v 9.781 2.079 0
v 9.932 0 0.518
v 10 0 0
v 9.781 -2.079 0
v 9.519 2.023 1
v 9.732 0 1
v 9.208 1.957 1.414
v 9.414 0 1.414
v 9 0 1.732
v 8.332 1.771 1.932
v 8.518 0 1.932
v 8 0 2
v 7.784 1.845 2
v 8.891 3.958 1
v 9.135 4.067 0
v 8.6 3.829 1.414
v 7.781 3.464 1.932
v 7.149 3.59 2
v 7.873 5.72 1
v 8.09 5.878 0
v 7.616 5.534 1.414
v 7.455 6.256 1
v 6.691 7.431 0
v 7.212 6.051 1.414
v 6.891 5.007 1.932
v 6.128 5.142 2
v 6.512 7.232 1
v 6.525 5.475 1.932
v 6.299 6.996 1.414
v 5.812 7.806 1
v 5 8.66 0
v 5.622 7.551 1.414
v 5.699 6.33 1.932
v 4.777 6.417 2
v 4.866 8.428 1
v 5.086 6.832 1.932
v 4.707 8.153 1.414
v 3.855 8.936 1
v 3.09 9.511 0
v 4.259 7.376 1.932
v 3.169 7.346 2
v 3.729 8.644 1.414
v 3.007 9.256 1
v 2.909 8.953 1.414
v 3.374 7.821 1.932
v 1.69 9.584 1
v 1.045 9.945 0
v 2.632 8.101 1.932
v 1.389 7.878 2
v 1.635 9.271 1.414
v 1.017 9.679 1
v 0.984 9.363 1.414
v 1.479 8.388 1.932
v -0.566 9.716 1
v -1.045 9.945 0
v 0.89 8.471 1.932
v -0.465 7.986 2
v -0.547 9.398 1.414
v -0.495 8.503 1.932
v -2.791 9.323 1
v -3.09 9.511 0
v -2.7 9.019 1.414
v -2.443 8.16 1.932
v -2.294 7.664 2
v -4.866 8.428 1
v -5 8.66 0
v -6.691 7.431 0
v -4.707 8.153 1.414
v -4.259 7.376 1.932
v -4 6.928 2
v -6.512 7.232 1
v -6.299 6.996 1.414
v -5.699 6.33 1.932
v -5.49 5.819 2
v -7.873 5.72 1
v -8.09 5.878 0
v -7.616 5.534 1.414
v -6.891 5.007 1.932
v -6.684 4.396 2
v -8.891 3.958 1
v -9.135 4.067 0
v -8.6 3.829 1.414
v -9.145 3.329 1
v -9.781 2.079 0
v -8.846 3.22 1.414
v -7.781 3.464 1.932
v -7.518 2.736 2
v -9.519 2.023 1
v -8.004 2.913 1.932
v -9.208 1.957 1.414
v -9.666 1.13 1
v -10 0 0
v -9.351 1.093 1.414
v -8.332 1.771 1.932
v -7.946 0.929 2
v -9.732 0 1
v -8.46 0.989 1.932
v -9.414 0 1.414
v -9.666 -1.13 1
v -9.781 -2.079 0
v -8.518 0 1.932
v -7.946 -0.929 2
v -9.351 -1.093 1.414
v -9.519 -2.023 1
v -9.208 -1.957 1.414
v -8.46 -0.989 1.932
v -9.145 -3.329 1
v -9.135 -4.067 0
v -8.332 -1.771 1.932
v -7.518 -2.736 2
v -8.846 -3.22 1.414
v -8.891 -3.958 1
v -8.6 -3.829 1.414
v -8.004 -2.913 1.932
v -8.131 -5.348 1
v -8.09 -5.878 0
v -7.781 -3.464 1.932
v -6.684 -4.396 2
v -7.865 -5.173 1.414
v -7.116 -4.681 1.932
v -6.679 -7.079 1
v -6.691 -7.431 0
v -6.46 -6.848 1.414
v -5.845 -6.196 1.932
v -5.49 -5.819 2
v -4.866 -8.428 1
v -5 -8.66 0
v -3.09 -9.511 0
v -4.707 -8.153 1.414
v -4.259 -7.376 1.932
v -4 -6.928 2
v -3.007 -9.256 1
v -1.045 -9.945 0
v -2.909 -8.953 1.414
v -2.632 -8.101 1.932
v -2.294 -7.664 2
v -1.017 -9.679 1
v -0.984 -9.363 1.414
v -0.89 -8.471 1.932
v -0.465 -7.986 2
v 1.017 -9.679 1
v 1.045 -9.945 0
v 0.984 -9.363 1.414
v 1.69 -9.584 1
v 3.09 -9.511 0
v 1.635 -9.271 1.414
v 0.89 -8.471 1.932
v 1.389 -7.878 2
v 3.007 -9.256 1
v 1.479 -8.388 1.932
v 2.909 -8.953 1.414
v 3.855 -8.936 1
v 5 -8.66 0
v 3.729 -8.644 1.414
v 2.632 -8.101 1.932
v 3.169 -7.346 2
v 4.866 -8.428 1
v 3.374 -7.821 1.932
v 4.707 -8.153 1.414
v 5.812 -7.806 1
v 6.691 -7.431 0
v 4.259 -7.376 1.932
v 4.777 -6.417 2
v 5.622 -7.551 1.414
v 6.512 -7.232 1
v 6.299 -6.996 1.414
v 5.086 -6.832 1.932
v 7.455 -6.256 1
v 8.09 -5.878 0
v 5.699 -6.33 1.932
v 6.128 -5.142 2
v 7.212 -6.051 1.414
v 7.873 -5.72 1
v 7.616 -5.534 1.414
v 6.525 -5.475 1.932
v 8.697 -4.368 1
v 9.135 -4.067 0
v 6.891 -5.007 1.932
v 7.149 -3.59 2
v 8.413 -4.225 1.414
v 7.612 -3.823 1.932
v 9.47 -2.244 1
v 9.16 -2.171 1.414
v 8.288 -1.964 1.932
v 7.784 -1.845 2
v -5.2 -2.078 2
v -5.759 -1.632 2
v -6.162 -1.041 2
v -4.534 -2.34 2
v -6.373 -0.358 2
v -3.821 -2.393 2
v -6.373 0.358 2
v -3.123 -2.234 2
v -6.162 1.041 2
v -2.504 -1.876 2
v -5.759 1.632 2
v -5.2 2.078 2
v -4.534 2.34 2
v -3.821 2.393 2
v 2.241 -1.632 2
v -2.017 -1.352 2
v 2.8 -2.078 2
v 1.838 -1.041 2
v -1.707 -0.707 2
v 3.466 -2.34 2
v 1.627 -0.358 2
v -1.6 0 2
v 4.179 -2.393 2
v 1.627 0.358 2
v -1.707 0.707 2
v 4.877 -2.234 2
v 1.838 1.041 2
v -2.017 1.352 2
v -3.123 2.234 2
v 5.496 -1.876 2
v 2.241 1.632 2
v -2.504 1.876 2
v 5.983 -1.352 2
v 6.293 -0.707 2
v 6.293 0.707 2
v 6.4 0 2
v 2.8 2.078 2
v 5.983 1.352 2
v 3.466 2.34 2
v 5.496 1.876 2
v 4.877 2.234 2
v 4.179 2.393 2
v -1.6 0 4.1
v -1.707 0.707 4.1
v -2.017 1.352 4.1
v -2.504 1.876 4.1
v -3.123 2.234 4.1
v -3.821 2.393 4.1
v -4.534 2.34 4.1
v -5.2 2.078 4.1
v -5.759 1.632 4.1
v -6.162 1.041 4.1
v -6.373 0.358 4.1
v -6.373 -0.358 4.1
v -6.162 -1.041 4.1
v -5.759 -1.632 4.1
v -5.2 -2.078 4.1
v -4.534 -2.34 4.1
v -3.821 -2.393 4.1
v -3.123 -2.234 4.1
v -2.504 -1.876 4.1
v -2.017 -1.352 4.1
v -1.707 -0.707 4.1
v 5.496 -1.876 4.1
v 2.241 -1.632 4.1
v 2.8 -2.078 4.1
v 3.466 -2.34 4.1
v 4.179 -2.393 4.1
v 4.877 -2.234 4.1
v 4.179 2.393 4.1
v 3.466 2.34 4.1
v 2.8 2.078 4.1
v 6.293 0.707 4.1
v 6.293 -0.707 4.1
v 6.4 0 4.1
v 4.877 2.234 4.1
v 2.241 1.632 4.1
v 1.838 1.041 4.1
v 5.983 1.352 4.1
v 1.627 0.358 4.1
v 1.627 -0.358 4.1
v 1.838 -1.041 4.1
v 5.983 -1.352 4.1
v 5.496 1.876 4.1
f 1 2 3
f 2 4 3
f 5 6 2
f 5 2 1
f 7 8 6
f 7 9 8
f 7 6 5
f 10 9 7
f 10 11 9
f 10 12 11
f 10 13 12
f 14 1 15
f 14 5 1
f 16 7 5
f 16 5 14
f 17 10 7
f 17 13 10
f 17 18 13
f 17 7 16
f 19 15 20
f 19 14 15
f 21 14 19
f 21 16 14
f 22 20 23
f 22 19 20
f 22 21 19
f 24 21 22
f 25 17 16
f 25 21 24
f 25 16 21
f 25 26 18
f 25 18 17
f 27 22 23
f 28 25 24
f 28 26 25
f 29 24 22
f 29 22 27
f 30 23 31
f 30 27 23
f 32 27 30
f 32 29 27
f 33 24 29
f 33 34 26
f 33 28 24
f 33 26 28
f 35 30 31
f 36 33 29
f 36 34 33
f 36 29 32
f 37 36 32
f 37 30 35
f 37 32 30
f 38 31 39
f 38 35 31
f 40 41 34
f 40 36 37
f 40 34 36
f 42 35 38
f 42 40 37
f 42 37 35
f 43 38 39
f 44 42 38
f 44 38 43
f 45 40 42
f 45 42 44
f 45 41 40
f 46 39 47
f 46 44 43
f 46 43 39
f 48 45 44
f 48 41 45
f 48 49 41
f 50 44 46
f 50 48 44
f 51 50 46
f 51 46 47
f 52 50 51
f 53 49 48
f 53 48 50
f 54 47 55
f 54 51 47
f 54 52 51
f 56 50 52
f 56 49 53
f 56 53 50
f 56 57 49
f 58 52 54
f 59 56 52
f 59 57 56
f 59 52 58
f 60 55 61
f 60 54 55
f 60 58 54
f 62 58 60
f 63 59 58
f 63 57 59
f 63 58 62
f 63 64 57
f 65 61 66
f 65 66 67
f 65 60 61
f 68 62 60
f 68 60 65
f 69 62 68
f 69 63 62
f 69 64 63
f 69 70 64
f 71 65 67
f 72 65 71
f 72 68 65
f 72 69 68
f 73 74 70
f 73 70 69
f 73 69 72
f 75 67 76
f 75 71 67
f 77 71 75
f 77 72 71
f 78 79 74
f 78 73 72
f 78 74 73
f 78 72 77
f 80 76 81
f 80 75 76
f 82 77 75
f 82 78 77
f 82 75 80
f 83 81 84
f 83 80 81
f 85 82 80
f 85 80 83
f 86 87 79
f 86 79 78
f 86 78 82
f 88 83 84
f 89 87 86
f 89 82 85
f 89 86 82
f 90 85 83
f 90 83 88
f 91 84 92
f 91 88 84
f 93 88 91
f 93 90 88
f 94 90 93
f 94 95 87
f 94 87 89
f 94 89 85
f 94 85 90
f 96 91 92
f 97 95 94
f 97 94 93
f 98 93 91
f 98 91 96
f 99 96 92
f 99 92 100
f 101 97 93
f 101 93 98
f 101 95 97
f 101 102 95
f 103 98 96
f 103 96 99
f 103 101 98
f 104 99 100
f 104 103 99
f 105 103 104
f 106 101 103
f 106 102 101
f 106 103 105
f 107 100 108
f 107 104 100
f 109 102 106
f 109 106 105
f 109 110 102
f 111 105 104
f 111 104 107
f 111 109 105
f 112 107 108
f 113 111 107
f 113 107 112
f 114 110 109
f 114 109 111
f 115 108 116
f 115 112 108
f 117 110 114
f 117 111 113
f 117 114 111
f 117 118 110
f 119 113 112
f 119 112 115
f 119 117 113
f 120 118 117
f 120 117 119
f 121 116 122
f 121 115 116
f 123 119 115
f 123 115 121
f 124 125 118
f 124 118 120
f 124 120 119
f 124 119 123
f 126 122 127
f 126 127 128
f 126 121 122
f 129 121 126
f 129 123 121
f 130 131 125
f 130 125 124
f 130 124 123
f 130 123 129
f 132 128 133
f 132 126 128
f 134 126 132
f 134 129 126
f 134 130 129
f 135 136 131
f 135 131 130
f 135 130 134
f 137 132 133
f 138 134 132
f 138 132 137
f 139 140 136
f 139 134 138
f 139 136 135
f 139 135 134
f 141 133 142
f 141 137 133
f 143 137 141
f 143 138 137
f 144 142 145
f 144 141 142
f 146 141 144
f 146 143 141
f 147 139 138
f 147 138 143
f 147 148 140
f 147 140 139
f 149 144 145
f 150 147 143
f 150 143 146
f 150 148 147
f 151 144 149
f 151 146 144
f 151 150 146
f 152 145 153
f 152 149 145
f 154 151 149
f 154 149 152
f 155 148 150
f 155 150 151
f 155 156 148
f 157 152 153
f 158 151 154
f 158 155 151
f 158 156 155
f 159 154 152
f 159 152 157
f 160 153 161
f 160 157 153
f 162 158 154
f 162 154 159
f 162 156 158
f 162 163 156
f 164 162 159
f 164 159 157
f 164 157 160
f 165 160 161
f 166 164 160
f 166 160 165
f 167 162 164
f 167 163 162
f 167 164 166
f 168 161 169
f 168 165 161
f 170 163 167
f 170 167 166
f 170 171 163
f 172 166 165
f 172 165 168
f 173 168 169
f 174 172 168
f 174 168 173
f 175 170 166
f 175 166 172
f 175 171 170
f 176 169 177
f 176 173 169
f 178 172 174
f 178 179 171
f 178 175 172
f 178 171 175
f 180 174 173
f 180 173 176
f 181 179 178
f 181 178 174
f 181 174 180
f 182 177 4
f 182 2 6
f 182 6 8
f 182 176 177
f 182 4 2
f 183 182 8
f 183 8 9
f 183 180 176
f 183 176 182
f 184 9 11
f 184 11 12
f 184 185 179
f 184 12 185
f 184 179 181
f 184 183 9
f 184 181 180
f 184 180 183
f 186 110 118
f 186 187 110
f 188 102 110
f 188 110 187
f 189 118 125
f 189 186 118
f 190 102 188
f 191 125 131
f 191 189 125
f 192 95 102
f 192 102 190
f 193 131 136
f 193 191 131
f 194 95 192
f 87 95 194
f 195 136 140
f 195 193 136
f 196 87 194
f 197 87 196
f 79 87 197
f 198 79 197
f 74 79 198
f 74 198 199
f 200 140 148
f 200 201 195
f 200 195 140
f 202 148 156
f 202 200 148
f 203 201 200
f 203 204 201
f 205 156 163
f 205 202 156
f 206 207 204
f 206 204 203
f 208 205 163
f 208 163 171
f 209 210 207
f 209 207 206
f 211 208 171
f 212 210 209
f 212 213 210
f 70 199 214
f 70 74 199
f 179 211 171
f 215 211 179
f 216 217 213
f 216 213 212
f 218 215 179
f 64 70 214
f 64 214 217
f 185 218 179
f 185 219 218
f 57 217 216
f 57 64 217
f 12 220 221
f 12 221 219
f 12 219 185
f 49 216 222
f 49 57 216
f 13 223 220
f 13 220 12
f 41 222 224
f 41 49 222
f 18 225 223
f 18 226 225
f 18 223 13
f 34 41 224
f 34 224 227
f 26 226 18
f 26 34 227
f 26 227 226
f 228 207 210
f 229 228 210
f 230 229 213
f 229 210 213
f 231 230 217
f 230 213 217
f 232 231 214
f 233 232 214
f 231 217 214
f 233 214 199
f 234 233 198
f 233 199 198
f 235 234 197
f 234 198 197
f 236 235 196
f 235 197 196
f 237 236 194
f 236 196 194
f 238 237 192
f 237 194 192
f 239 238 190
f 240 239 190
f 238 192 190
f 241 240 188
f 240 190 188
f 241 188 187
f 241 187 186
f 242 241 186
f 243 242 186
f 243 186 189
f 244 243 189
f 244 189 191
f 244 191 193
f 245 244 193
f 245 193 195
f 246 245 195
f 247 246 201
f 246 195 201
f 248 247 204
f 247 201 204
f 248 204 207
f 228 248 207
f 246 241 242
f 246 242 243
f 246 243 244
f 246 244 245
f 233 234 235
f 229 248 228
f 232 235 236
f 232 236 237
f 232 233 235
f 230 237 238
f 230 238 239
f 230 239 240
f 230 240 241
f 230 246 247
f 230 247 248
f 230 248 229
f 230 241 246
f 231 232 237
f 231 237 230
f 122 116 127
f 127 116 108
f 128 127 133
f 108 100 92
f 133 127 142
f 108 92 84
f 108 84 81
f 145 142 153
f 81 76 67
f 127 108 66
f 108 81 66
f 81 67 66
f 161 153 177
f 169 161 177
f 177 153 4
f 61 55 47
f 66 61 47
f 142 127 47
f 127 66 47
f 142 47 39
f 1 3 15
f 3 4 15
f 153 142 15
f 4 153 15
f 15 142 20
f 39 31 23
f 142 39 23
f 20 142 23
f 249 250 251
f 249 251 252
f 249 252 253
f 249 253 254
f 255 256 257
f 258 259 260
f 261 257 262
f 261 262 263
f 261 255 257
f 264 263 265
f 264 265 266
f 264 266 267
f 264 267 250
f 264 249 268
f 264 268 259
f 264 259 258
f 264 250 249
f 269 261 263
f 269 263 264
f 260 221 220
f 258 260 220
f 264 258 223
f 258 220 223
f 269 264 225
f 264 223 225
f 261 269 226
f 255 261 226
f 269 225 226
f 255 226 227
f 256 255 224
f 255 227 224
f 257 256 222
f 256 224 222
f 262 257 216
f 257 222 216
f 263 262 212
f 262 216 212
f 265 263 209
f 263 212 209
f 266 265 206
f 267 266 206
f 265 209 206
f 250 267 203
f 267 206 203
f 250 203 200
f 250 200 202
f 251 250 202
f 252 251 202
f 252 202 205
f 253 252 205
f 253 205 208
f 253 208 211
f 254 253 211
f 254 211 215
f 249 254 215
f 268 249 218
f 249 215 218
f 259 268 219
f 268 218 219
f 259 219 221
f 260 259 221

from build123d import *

# Parameters (mm, degrees)
F0_R     = 10
F1_DEPTH = 2
F2_R     = 1.99999
F3_R     = 2.4
F4_DEPTH = 2.1


# Not quite as in the source:
# - a fillet or chamfer is up to 0.001 mm smaller than in the source, because OpenCascade refuses the exact size


with BuildPart() as f1:
    # F0 (on Top) → F1 (new body)
    with BuildSketch(Plane.XY):
        Circle(F0_R)
    extrude(amount=F1_DEPTH)

    # F2 (radius 2 in the source; OpenCascade refuses exactly that, so slightly less here)
    f2_edges = [f1.edges().sort_by_distance(p)[0] for p in [
        (-10, 0, 2),
    ]]
    fillet(f2_edges, radius=F2_R)

    # F3 (on face) → F4 (join)
    with BuildSketch(Plane.XY.offset(2)):
        with Locations((-4, 0)):
            Circle(F3_R)
        with Locations((4, 0)):
            Circle(F3_R)
    extrude(amount=F4_DEPTH)


solid = f1.part
